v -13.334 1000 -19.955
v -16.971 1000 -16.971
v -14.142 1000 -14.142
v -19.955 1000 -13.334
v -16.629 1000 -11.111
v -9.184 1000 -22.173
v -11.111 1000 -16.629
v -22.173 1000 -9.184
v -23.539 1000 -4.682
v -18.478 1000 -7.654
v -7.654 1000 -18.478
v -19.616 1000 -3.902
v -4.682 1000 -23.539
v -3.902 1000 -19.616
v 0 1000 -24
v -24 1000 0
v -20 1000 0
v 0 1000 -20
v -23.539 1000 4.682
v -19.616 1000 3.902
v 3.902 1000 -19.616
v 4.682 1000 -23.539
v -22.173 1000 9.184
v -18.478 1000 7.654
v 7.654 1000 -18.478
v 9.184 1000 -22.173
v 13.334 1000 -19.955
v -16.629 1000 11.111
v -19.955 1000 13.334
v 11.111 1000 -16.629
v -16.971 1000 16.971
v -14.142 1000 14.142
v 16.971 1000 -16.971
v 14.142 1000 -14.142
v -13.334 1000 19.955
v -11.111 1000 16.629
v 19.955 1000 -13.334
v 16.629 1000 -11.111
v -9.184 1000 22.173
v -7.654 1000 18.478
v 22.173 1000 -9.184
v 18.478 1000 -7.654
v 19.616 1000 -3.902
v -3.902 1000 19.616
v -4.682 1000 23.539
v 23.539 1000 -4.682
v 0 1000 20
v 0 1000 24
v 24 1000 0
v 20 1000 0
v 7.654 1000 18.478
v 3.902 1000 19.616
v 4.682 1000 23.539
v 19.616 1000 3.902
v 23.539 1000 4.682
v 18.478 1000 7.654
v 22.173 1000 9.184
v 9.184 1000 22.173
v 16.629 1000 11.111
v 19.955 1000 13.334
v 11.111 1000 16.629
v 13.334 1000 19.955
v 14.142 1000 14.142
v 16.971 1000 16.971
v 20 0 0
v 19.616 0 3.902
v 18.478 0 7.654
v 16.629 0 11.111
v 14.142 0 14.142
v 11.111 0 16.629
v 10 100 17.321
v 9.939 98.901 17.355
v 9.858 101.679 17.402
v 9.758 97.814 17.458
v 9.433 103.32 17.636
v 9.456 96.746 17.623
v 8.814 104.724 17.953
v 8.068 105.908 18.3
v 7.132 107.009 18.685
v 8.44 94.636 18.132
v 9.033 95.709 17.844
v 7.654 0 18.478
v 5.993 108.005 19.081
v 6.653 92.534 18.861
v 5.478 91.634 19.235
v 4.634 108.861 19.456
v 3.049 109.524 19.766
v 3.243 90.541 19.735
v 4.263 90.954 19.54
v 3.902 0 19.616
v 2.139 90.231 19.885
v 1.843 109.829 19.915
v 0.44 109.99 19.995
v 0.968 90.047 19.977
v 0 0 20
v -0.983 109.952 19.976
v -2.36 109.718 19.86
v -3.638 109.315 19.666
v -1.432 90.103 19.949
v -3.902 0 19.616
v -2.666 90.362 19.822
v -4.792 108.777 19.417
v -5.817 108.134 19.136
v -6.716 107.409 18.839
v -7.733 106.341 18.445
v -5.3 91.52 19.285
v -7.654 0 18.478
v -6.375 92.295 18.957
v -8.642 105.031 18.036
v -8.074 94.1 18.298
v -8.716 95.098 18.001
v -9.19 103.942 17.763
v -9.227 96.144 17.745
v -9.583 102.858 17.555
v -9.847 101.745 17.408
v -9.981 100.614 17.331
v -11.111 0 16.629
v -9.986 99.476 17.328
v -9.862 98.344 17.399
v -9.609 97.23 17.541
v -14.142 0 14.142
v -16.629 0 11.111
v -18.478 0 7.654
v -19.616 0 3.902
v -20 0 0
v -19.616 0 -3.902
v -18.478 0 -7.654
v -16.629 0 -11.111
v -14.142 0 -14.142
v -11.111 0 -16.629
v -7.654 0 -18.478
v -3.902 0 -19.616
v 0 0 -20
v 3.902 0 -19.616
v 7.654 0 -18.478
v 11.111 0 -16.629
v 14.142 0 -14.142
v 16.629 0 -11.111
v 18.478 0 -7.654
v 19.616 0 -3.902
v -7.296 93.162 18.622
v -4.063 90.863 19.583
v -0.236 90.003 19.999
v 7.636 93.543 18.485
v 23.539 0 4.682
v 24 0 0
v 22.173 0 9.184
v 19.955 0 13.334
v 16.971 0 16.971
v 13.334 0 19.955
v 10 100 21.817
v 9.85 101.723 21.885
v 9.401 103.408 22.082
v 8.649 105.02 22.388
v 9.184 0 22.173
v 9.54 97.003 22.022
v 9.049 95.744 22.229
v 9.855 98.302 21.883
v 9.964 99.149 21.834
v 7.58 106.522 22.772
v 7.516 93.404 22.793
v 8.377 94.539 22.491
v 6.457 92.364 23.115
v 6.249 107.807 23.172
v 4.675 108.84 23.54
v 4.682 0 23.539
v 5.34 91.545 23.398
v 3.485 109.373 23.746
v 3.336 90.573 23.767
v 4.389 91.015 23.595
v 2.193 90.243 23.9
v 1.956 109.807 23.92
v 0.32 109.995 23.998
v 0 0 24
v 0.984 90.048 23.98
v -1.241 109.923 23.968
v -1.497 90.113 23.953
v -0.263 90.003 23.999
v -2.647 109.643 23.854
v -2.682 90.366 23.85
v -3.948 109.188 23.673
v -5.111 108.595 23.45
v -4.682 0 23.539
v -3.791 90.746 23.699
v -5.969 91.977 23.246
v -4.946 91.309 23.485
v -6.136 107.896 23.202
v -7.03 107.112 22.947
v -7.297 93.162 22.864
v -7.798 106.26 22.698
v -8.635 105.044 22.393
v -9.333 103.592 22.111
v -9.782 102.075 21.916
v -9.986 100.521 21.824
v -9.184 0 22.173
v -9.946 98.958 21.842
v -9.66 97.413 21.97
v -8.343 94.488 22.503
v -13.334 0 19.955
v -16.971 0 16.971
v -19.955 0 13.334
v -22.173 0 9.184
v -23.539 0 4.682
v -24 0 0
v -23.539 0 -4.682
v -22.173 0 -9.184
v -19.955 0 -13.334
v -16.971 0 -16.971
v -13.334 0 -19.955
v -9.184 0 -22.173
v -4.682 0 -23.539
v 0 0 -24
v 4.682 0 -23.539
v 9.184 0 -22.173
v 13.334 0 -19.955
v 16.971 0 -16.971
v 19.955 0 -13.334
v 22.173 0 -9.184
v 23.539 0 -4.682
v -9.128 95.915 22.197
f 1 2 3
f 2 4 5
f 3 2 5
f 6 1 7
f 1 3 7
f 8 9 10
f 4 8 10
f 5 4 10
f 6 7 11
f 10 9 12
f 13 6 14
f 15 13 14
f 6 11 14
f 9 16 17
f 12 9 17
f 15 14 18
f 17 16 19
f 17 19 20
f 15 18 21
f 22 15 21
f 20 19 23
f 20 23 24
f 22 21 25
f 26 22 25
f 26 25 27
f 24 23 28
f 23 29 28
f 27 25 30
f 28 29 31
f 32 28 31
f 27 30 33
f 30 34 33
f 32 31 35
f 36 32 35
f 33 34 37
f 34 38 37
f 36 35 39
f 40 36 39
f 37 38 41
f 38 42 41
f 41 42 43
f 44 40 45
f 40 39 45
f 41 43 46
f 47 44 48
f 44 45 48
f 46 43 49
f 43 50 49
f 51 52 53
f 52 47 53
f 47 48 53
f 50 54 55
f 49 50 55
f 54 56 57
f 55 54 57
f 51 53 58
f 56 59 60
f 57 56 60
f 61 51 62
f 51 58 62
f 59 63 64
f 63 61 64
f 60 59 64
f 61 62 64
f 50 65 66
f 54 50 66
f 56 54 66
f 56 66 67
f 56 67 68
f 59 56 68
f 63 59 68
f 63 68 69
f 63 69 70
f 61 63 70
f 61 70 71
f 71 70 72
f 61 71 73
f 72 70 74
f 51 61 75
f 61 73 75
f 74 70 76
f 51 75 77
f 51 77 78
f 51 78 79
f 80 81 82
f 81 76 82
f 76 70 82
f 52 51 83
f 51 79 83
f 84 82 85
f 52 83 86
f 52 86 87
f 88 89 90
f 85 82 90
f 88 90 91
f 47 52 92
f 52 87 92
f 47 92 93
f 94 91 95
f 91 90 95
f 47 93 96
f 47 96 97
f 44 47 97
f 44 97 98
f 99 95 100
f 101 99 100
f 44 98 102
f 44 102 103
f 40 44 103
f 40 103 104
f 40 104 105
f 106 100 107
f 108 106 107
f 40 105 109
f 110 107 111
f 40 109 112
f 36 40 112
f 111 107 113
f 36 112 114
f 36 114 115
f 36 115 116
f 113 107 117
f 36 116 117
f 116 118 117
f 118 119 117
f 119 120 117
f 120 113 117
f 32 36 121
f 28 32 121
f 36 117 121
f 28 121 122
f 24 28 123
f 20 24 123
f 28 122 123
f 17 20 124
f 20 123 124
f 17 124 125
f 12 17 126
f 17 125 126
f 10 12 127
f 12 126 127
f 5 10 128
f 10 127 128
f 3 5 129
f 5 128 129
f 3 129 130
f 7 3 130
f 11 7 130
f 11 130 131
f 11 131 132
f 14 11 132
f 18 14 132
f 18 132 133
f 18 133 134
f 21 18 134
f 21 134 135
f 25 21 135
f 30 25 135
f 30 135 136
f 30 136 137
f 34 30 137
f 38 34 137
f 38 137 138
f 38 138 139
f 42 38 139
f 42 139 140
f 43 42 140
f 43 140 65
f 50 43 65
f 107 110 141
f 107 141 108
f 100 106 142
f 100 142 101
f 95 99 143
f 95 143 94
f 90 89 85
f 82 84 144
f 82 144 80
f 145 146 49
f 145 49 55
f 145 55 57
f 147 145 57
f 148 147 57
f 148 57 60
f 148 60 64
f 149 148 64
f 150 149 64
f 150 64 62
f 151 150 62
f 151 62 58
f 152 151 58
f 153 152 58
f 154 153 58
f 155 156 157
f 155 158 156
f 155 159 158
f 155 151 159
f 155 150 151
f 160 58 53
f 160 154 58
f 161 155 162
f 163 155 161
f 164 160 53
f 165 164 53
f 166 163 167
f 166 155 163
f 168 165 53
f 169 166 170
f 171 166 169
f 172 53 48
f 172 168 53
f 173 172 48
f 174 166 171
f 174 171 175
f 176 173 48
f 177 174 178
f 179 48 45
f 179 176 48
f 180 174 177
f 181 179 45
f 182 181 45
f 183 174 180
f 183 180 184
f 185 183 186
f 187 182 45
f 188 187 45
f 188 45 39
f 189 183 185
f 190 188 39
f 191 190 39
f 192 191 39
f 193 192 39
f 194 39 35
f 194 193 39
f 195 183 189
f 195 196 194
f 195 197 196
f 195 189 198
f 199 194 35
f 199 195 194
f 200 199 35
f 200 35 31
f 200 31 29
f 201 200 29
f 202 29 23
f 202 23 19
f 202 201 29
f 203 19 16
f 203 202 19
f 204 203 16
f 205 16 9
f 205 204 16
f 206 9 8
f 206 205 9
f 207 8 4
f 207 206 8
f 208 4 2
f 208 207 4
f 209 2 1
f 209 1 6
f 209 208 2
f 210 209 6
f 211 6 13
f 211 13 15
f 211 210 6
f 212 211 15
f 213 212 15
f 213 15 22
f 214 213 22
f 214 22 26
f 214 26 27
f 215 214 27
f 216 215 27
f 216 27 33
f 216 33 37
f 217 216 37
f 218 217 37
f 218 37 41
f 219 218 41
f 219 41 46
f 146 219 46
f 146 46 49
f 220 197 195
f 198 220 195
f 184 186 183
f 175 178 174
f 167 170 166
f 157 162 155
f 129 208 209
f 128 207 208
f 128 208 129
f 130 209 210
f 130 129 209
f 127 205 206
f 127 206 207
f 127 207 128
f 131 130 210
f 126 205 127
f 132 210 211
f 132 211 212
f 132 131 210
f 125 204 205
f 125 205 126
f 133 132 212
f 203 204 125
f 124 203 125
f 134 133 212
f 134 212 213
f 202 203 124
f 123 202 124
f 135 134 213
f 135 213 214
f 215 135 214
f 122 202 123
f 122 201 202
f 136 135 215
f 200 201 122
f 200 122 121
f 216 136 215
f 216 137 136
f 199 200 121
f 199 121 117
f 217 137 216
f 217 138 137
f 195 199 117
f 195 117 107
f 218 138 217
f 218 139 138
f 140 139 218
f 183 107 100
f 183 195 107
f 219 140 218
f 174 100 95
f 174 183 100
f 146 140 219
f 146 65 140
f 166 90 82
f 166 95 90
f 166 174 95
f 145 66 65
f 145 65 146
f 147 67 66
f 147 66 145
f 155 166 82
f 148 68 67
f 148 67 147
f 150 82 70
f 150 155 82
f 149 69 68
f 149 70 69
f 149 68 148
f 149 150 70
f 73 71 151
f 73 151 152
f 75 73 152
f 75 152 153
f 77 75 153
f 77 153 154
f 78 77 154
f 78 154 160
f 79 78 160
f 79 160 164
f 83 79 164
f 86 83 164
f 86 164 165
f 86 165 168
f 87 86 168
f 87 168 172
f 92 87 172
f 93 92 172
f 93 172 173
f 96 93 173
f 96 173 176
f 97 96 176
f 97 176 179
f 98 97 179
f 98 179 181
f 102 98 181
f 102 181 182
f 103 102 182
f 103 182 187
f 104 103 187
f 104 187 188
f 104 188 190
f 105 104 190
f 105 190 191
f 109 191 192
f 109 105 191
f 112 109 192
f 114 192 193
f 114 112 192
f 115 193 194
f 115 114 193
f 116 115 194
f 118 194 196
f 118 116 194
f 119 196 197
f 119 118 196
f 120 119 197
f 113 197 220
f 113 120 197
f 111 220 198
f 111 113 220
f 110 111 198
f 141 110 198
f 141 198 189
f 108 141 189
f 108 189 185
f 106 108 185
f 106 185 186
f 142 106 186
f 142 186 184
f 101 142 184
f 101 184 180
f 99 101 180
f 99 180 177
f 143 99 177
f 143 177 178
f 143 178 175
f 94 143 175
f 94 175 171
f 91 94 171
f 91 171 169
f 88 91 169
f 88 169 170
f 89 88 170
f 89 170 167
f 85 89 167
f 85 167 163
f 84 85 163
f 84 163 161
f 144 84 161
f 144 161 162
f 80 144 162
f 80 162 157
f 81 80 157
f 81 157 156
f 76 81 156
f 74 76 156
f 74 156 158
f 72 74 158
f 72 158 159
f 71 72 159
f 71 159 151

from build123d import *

# Parameters (mm, degrees)
F0_R     = 24
F1_DEPTH = 1000
F2_R     = 20
F3_DEPTH = 1000.001
F4_R     = 10
F5_DEPTH = 25.4


with BuildPart() as f1:
    # F0 (on Front) → F1 (new body)
    with BuildSketch(Plane.XZ):
        Circle(F0_R)
    extrude(amount=-F1_DEPTH)

    # F2 (on Front) → F3 (cut, through all)
    with BuildSketch(Plane.XZ):
        Circle(F2_R)
    extrude(amount=-F3_DEPTH, mode=Mode.SUBTRACT)

    # F4 (on Top) → F5 (cut)
    with BuildSketch(Plane.XY):
        with Locations((0, 100)):
            Circle(F4_R)
    extrude(amount=F5_DEPTH, mode=Mode.SUBTRACT)


solid = f1.part
